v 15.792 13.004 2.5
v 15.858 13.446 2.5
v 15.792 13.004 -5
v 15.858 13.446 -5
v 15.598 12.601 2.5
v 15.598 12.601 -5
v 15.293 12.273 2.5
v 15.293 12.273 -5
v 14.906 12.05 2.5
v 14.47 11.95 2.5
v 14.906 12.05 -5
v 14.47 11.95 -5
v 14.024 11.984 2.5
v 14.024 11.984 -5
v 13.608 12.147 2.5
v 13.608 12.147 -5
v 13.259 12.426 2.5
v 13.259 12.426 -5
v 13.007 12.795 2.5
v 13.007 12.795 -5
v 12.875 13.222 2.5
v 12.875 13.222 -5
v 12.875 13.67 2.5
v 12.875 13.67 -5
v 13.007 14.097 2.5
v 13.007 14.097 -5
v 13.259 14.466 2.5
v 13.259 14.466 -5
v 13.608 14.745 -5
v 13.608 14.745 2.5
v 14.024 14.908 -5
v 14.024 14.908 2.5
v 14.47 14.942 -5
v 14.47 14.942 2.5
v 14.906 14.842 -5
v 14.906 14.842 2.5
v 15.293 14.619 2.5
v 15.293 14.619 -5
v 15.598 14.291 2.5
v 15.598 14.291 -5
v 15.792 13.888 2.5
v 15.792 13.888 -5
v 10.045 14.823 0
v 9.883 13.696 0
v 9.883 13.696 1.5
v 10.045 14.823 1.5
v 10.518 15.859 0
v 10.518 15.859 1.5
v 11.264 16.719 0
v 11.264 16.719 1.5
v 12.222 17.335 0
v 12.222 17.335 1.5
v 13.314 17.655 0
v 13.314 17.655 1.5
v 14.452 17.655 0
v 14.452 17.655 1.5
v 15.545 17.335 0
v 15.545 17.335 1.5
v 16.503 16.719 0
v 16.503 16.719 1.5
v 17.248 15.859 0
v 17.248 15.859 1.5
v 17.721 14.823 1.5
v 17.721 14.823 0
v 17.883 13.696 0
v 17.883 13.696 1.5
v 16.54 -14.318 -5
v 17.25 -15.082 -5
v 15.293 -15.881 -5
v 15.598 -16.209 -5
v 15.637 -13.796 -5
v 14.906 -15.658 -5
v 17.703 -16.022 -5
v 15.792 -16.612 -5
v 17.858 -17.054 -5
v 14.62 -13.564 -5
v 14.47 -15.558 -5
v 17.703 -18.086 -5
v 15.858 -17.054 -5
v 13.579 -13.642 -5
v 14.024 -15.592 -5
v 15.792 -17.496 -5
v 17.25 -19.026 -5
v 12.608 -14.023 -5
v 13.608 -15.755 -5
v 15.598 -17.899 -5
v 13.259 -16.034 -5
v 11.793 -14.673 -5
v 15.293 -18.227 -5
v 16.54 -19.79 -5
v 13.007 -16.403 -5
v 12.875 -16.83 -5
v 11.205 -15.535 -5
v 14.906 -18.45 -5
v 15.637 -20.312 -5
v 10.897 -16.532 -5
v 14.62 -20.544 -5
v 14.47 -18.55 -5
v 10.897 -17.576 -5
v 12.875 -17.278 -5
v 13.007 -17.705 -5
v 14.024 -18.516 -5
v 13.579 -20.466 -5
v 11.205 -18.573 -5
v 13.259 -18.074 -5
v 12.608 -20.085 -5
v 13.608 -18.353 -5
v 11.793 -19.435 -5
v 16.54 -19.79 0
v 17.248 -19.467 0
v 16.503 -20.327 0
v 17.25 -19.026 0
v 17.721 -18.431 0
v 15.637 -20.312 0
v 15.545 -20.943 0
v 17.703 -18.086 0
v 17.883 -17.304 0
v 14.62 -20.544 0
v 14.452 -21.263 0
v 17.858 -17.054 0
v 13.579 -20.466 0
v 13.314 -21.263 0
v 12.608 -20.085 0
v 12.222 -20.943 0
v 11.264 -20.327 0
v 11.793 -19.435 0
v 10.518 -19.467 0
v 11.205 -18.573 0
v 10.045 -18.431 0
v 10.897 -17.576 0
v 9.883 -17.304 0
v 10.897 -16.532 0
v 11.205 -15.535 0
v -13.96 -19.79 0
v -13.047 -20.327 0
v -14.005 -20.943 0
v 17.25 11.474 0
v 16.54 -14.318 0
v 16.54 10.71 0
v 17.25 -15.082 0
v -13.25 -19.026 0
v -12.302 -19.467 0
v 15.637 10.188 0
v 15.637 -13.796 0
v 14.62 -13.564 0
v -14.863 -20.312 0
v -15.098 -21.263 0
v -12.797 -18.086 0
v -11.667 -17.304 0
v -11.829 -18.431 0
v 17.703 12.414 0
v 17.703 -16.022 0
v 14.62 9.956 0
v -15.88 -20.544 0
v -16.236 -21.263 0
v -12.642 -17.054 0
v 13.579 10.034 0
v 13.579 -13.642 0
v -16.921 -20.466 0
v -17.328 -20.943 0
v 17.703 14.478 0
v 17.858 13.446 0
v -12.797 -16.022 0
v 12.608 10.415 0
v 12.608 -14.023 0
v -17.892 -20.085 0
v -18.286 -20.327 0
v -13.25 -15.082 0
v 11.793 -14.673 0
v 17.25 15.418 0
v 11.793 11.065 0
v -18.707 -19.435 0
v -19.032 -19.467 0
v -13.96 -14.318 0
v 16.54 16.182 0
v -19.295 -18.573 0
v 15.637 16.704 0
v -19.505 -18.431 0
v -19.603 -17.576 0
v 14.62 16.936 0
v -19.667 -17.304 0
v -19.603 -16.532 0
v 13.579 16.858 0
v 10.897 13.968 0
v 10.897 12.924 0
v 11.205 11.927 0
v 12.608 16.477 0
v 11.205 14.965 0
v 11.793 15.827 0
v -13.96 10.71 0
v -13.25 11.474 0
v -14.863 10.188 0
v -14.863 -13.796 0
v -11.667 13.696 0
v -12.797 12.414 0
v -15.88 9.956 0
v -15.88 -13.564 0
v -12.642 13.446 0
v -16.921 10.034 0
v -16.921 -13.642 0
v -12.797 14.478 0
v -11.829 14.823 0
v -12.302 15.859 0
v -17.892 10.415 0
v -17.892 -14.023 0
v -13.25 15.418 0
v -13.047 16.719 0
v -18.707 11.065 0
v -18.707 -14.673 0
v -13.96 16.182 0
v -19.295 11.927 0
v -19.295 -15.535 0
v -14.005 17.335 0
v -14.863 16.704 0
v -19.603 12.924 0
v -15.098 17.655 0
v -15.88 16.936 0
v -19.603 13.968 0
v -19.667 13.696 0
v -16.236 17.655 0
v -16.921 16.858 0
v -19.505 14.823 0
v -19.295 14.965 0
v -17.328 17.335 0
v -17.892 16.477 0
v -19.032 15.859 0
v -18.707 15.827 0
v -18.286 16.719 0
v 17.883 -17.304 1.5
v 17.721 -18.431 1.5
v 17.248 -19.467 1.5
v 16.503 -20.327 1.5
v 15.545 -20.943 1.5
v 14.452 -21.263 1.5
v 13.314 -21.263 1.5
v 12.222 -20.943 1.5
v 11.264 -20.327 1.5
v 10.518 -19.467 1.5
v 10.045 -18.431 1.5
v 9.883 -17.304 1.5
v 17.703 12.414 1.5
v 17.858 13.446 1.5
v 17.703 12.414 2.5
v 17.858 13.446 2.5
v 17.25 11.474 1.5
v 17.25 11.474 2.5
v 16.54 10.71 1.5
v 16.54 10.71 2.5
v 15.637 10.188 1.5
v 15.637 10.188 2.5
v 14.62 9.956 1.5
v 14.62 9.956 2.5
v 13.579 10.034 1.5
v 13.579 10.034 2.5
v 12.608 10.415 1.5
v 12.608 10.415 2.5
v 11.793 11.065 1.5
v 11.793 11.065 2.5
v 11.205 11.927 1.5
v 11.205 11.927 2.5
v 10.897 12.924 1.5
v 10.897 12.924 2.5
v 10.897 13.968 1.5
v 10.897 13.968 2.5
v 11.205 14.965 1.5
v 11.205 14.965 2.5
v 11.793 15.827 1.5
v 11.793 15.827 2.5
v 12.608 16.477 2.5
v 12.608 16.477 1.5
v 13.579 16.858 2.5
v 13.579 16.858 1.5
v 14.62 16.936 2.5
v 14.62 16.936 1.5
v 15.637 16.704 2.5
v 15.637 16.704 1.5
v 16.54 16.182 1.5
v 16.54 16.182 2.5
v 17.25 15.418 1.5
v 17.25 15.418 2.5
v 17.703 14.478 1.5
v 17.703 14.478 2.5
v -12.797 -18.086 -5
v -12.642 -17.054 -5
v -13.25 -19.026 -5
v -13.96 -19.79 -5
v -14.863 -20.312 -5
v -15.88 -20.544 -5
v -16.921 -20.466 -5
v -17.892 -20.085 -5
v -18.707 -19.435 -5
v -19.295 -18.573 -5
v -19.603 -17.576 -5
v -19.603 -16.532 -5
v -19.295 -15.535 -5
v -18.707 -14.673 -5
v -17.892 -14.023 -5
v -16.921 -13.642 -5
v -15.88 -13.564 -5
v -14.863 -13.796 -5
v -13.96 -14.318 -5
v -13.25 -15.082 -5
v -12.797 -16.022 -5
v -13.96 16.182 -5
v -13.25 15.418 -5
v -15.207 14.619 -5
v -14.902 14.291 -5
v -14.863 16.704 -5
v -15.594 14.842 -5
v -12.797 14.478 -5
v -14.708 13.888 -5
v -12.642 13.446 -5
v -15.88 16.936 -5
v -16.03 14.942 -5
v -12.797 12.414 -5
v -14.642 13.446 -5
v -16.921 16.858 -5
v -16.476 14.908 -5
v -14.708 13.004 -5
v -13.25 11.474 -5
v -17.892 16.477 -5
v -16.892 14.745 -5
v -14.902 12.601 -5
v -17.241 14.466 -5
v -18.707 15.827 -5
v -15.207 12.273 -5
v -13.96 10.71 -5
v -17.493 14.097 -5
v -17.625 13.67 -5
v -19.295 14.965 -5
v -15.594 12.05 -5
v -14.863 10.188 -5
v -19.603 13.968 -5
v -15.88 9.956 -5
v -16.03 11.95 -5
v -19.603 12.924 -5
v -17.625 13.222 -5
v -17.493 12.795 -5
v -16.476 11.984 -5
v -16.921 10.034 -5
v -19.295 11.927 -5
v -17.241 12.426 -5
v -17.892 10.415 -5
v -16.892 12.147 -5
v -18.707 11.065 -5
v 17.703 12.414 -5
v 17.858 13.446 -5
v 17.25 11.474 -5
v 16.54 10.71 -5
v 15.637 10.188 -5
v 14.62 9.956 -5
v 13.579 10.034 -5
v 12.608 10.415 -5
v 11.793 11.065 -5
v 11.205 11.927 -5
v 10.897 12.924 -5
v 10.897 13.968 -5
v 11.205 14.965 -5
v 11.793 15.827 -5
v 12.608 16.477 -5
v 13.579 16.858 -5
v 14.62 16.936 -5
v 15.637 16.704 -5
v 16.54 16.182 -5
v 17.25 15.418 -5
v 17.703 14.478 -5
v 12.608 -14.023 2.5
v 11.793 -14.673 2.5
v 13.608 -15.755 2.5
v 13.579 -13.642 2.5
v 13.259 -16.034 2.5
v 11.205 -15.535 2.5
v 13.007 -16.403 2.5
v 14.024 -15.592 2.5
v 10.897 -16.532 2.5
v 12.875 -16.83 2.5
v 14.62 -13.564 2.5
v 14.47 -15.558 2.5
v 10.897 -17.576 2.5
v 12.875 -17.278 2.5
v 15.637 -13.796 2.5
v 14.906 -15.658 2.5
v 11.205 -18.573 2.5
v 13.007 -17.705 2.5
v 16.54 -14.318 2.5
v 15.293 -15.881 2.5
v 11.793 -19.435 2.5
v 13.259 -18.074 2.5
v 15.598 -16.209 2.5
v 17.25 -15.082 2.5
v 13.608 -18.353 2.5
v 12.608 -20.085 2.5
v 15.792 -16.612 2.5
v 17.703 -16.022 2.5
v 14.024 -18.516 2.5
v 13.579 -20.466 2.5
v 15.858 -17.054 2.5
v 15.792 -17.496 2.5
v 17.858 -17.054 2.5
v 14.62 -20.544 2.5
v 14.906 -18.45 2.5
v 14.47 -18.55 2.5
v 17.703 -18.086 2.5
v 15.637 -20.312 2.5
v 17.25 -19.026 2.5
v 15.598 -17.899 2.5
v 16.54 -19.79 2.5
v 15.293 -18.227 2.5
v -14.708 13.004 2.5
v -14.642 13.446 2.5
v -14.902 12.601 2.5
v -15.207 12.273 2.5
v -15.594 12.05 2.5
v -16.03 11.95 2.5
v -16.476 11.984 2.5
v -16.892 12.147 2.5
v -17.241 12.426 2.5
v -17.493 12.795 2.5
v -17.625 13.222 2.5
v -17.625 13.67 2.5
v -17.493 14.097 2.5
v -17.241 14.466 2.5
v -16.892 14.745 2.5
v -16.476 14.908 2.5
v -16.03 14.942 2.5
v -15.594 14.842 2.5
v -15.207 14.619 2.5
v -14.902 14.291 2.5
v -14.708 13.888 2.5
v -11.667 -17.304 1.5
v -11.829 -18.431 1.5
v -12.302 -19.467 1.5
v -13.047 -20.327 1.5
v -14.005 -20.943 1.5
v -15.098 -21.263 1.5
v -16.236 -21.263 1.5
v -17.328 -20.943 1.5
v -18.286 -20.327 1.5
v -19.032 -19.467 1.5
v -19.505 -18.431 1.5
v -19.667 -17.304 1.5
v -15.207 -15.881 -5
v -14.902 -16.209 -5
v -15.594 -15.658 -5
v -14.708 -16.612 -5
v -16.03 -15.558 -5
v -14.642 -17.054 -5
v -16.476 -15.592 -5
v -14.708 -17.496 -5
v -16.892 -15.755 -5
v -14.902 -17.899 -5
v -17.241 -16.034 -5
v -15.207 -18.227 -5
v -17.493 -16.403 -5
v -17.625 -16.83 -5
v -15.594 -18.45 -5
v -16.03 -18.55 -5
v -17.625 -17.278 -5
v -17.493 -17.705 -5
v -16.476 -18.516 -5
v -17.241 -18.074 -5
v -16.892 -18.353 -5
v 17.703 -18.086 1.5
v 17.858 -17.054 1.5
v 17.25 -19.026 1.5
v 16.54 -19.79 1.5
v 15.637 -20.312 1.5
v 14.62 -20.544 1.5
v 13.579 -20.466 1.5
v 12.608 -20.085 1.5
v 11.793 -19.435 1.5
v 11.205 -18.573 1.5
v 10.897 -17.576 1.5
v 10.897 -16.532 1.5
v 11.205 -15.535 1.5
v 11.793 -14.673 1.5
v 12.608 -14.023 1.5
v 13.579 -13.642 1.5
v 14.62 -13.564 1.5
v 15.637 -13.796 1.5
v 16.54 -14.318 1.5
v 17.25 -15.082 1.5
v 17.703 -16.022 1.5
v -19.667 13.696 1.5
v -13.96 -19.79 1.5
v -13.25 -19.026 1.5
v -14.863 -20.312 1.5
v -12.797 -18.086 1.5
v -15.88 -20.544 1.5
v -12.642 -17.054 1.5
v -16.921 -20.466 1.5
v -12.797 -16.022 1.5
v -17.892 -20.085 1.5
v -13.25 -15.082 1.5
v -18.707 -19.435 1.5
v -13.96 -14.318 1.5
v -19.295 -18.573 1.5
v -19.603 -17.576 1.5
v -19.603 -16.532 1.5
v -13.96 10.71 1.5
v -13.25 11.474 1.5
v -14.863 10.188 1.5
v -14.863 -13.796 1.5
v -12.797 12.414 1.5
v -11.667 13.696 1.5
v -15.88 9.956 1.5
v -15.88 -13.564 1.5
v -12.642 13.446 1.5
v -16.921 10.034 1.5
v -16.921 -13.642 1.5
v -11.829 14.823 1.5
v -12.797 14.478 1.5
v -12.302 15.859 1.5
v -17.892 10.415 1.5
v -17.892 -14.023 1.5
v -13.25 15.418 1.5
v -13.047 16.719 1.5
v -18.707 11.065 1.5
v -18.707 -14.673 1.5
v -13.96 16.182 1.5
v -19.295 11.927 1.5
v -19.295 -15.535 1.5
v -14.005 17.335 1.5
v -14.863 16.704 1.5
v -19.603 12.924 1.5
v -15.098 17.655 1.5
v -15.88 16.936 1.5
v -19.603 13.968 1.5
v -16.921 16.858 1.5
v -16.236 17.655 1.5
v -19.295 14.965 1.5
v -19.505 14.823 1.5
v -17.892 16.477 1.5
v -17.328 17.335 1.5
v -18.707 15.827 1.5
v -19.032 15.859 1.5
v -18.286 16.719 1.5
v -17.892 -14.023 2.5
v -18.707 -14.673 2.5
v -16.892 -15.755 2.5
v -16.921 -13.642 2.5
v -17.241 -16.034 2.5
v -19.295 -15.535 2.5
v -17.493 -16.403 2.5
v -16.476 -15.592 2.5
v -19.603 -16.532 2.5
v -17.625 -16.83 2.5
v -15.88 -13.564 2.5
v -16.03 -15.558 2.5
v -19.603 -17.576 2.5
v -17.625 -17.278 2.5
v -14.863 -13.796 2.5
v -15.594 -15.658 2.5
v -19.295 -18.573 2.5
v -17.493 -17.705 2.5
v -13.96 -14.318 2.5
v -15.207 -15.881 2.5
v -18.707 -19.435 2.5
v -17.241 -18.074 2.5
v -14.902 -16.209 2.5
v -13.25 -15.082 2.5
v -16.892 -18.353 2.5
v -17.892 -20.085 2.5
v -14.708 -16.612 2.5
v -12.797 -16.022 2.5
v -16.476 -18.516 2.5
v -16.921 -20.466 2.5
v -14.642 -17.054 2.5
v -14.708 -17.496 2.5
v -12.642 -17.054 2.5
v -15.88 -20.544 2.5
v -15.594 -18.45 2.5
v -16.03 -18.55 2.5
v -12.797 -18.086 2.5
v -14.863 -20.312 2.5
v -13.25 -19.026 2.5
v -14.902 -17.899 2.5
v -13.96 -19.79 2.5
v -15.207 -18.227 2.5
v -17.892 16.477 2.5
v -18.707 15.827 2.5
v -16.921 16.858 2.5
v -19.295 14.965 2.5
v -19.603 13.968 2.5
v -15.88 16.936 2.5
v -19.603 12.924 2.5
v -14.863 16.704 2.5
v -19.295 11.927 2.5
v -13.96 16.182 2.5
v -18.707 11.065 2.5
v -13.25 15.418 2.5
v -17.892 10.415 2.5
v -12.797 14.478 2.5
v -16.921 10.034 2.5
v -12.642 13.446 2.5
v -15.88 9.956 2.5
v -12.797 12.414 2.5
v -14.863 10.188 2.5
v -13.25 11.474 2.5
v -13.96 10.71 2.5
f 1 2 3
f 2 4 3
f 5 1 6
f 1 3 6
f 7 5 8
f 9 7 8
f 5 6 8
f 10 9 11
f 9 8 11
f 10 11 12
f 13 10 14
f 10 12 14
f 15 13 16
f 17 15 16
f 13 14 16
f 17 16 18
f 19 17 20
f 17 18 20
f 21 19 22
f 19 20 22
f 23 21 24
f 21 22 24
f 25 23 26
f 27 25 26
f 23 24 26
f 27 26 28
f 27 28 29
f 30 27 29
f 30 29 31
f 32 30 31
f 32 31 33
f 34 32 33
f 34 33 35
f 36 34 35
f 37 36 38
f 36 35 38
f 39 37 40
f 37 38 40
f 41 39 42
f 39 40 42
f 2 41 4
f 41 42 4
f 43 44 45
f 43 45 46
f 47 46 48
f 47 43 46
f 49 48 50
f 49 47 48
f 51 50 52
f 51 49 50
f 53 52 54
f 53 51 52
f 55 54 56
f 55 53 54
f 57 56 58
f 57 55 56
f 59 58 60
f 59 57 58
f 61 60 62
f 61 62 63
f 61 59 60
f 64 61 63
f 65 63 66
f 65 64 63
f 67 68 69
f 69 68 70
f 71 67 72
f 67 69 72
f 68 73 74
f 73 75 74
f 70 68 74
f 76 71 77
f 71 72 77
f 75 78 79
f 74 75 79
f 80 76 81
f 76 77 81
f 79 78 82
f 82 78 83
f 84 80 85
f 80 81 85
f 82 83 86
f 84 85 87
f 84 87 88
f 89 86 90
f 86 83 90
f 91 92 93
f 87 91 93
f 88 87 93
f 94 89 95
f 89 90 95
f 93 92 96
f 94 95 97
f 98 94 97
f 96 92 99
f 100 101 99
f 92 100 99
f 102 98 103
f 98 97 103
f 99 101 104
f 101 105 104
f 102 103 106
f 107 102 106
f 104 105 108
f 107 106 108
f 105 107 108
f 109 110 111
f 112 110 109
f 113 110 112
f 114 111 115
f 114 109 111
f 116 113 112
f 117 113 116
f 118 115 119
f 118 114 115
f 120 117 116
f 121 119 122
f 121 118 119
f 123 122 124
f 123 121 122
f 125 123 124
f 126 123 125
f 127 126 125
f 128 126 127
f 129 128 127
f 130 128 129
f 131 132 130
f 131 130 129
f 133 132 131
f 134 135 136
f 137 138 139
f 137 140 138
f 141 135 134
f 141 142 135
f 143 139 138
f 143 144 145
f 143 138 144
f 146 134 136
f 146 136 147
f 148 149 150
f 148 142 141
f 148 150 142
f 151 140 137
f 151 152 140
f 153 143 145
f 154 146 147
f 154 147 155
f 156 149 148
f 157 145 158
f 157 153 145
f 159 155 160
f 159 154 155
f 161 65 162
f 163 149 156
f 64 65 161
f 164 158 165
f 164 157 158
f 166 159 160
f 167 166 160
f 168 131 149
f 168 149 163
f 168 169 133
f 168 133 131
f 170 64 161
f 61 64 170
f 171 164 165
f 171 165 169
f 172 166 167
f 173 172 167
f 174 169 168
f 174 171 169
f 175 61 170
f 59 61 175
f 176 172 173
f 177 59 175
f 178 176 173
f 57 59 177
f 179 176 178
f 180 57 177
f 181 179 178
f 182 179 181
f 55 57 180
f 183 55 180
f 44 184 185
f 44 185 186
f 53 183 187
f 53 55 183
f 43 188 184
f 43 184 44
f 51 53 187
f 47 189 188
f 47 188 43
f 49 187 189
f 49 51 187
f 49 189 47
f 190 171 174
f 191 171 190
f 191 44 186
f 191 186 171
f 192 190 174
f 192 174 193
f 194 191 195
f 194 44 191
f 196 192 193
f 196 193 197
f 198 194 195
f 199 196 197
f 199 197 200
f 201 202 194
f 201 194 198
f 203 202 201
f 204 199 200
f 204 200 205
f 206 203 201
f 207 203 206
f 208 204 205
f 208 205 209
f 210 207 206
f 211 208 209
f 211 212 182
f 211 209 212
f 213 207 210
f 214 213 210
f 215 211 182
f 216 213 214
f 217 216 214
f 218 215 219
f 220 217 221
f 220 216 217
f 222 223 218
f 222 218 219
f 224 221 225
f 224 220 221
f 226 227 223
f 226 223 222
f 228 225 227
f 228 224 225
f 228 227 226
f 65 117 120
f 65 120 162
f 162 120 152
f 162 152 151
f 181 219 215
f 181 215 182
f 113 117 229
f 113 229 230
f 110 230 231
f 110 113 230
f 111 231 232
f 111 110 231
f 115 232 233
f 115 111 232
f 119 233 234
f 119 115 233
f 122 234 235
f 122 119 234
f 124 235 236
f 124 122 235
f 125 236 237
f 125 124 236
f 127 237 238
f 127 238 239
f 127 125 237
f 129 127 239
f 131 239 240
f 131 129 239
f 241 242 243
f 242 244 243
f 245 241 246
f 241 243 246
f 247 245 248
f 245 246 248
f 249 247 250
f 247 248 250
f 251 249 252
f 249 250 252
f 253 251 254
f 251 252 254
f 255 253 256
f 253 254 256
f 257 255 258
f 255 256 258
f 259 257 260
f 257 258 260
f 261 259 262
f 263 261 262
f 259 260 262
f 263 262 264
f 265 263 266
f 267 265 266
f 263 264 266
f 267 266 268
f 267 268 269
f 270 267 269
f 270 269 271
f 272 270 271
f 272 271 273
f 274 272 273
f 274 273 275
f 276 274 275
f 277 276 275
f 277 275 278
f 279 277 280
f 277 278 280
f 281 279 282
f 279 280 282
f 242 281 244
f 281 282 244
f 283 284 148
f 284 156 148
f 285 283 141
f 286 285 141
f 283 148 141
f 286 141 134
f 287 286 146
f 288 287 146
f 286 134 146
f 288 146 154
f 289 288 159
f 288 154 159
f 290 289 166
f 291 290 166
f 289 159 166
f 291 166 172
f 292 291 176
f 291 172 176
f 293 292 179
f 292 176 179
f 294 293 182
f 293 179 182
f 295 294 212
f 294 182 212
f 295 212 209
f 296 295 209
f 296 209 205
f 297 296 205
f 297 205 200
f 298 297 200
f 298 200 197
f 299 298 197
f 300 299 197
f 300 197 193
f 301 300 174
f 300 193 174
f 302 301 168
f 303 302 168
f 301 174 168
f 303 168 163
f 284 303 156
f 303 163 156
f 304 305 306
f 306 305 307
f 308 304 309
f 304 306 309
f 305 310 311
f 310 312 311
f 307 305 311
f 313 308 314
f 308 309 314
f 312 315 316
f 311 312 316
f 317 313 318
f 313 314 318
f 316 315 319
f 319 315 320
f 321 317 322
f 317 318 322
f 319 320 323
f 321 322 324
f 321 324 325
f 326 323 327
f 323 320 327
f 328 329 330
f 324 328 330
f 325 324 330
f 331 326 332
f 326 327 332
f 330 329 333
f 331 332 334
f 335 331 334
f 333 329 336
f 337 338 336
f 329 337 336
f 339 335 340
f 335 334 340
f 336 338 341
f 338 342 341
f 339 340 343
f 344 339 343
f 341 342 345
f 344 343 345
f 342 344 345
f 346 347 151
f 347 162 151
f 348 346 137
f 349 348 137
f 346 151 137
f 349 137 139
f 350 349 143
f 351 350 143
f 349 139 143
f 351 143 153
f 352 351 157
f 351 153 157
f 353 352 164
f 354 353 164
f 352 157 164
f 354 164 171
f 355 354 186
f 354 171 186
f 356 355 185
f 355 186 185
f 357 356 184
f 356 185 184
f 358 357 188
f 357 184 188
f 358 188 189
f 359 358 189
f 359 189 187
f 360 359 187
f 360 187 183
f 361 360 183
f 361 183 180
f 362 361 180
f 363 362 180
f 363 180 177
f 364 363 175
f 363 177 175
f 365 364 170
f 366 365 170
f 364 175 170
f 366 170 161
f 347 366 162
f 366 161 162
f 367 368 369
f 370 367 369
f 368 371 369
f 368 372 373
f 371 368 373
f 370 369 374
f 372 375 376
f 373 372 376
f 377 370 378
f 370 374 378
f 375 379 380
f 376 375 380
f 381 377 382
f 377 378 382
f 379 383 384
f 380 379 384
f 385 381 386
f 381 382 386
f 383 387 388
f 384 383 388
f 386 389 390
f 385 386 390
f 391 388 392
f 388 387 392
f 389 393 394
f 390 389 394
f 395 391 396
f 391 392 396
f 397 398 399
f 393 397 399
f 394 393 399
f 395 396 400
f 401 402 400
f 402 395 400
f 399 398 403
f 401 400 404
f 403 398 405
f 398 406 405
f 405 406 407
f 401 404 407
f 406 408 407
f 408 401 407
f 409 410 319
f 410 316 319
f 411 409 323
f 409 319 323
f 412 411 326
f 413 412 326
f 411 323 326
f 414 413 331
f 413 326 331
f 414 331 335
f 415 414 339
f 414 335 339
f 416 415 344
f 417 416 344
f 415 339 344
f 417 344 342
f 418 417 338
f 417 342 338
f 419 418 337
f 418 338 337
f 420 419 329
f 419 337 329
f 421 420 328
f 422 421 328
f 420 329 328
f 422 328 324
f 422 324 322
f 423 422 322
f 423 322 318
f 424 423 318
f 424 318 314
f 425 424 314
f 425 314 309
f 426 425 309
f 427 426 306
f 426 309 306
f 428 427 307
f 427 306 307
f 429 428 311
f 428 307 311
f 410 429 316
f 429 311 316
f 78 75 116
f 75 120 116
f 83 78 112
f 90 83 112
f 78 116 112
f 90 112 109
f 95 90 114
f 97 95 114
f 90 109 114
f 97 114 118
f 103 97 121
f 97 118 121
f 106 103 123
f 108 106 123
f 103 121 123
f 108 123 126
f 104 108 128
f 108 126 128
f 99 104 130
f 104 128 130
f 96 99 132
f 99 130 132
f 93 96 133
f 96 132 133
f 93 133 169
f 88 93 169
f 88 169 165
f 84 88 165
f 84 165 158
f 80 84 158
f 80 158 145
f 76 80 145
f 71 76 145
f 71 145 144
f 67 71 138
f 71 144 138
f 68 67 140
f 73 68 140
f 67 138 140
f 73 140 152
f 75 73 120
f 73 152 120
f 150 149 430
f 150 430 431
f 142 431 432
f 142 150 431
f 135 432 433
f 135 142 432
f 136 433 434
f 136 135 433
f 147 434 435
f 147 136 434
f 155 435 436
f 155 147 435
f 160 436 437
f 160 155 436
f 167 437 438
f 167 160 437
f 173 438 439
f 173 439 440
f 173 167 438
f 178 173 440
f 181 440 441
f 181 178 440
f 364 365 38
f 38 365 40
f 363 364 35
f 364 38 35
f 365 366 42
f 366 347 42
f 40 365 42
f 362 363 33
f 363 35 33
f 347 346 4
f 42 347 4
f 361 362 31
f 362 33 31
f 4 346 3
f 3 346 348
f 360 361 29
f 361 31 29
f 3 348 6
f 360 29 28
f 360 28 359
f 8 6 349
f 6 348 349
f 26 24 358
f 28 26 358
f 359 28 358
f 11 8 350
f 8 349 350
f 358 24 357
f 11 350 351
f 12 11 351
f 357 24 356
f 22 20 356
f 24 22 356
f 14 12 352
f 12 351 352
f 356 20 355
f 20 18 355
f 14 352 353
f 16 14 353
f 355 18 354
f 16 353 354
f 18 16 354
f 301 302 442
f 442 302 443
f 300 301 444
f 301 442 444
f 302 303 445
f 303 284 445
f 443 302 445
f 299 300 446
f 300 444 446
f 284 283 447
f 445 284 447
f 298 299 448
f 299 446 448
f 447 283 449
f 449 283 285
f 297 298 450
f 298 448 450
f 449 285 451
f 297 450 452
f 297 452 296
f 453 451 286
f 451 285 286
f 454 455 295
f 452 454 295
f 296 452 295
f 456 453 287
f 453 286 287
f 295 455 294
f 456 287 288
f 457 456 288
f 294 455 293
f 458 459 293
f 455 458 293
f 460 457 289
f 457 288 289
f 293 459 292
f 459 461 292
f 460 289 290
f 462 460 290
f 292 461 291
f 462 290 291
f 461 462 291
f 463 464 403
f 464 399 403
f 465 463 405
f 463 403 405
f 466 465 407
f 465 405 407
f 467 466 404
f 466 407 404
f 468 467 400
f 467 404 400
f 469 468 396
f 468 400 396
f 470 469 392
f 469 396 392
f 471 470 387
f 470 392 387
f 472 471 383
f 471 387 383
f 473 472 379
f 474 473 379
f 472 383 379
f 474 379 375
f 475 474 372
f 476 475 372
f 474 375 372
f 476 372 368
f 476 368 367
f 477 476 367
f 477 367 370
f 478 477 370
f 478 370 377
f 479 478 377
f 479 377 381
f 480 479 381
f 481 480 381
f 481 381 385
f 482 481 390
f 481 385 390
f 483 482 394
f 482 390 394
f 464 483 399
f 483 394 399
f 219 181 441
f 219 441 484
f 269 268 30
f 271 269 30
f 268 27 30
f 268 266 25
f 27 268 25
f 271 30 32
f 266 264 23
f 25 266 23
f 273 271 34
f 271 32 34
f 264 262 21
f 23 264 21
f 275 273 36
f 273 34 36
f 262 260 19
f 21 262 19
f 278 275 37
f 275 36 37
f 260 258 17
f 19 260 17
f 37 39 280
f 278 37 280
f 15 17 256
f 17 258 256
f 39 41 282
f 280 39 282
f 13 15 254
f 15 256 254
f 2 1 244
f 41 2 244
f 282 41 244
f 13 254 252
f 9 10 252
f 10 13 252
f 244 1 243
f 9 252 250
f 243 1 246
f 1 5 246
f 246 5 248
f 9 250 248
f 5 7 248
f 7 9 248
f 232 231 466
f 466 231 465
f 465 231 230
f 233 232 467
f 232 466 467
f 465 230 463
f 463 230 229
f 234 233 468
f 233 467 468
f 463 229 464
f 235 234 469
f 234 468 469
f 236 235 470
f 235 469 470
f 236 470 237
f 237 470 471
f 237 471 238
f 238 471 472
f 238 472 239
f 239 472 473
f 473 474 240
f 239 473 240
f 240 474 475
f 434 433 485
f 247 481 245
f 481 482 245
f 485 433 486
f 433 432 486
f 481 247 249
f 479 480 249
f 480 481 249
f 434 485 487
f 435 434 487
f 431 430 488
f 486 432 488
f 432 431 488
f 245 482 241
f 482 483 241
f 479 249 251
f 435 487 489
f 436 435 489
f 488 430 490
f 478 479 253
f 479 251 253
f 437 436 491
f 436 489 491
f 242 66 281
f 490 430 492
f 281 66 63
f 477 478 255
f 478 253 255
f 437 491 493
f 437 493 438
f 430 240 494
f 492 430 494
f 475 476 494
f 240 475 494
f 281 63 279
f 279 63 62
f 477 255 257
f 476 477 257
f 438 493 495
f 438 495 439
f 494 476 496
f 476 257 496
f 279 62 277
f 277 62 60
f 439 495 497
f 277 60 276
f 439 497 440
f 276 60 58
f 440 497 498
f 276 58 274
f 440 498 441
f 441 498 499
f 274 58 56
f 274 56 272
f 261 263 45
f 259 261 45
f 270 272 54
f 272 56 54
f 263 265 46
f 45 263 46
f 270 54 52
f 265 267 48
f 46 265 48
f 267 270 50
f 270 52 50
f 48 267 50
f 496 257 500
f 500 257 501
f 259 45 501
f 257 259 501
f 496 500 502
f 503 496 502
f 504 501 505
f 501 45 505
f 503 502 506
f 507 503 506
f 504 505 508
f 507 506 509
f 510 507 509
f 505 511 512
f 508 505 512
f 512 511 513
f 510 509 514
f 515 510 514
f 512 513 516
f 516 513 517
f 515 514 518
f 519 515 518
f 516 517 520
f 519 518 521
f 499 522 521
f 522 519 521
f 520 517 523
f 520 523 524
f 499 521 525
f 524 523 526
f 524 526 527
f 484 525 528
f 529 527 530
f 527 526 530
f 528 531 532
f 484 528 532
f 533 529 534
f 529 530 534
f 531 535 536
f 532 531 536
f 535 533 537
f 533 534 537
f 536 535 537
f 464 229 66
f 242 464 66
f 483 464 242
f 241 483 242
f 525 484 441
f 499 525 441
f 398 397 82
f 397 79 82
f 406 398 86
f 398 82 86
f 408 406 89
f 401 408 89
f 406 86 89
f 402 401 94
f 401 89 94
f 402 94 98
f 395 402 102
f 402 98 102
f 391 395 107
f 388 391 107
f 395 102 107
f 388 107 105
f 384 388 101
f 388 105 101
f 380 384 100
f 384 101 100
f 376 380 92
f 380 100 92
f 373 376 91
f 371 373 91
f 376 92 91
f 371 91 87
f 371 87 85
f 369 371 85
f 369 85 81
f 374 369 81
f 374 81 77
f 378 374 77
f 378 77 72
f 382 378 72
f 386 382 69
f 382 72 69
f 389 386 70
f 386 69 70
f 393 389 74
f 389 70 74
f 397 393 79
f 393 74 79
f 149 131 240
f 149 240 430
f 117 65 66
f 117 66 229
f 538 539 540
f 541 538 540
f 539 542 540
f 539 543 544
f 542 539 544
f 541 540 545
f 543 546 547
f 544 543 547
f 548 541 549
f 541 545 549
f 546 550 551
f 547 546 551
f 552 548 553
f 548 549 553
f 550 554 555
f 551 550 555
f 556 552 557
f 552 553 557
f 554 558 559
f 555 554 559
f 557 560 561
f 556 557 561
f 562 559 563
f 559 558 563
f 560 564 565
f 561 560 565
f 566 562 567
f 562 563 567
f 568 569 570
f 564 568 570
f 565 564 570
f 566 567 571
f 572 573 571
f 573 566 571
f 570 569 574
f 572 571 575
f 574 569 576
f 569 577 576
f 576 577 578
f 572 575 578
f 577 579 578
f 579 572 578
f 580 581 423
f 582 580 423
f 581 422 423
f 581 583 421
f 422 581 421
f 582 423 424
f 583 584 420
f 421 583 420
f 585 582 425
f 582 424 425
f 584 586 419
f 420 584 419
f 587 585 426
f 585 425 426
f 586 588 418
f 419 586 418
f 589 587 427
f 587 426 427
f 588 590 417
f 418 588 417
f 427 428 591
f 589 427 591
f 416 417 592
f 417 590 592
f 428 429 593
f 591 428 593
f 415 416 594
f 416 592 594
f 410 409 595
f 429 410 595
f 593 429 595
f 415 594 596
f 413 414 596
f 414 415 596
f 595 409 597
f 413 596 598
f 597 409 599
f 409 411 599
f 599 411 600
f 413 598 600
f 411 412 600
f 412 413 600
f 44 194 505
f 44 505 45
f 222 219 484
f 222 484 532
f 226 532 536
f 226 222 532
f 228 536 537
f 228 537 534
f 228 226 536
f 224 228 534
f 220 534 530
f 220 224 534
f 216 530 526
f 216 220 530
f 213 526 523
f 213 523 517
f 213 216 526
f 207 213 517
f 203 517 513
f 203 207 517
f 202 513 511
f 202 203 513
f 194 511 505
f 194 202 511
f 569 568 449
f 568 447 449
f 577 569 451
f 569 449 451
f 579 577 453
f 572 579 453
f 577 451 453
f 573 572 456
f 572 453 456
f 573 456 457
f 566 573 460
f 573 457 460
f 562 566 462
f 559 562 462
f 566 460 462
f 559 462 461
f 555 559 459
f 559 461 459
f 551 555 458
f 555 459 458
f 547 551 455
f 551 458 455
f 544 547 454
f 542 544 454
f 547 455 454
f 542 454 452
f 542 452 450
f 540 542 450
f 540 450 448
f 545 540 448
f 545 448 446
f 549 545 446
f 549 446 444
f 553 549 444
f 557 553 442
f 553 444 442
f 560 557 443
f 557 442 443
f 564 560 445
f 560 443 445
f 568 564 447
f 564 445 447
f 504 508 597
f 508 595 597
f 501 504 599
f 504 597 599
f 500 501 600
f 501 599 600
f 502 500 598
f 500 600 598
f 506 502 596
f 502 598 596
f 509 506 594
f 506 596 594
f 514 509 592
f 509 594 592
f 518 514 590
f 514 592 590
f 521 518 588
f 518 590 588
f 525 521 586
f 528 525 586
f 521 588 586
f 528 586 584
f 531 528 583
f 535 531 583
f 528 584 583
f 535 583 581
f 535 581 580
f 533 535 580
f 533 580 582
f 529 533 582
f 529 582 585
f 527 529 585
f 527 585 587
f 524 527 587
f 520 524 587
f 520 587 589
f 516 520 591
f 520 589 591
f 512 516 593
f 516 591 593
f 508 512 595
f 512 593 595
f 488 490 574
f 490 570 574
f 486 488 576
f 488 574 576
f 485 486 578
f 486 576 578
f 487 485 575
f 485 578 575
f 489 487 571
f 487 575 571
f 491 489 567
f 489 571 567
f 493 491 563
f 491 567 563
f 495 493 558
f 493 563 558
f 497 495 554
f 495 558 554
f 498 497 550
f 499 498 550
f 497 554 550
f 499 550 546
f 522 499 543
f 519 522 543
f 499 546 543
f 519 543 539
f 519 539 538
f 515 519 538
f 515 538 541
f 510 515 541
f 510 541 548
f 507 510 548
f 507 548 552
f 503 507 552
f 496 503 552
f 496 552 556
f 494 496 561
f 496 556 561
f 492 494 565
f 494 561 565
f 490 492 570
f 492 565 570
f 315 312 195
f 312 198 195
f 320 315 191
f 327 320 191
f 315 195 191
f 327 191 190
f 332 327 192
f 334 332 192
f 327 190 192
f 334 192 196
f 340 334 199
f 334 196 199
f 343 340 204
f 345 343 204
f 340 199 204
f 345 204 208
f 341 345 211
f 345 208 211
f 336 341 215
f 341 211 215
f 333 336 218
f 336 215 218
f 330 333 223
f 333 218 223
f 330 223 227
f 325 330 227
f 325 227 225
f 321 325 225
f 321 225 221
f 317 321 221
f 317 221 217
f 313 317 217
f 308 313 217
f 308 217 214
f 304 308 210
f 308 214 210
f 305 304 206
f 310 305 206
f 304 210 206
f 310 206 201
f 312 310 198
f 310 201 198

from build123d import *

# Parameters (mm, degrees)
CROQUIS1_R              = 2.5
SALIENTE_EXTRUIR1_DEPTH = 1.5
MATRIZL1_COUNT          = 2
MATRIZL1_PITCH          = 30.5
MATRIZL1_COUNT_DIR2     = 2
MATRIZL1_PITCH_DIR2     = 30.5


with BuildPart() as part:
    # Croquis1 → Saliente-Extruir1 (new body)
    with BuildSketch(Plane.XY):
        with BuildLine():
            Line((17.88322612, 13.695977011), (17.88322612, -17.304022989))
            ThreePointArc((17.88322612, -17.304022989), (13.88322612, -21.304022989), (9.88322612, -17.304022989))
            Line((9.88322612, -17.304022989), (-11.66677388, -17.304022989))
            ThreePointArc((-11.66677388, -17.304022989), (-15.66677388, -21.304022989), (-19.66677388, -17.304022989))
            Line((-19.66677388, -17.304022989), (-19.66677388, 13.695977011))
            ThreePointArc((-19.66677388, 13.695977011), (-15.66677388, 17.695977011), (-11.66677388, 13.695977011))
            Line((-11.66677388, 13.695977011), (9.88322612, 13.695977011))
            ThreePointArc((9.88322612, 13.695977011), (13.88322612, 17.695977011), (17.88322612, 13.695977011))
        make_face()
        with Locations((-16.14177388, 13.445977011)):
            Circle(CROQUIS1_R, mode=Mode.SUBTRACT)
        with Locations((14.35822612, 13.445977011)):
            Circle(CROQUIS1_R, mode=Mode.SUBTRACT)
        with Locations((14.35822612, -17.054022989)):
            Circle(CROQUIS1_R, mode=Mode.SUBTRACT)
        with Locations((-16.14177388, -17.054022989)):
            Circle(CROQUIS1_R, mode=Mode.SUBTRACT)
    extrude(amount=SALIENTE_EXTRUIR1_DEPTH)

    # Croquis3 → Revolución1 (revolve)
    with BuildSketch(Plane(origin=(0, -17.054022989, 0), x_dir=(-1, 0, 0), z_dir=(0, -1, 0)), mode=Mode.PRIVATE) as revoluci_n1_sk:
        Polygon((18.64177388, -1.5), (19.64177388, -1.5), (19.64177388, -2.5), (17.64177388, -2.5), (17.64177388, 5), (19.64177388, 5), (19.64177388, 0), (18.64177388, 0), align=None)
    revoluci_n1 = revolve(revoluci_n1_sk.sketch.rotate(Axis((-16.14177388, -17.054022989, 2.5), (0, 0, -1)), 180), axis=Axis((-16.14177388, -17.054022989, 2.5), (0, 0, -1)))

    # MatrizL1: Revoluci_n1 2 × 2
    with Locations(*[(i * MATRIZL1_PITCH, j * MATRIZL1_PITCH_DIR2, 0) for i in range(MATRIZL1_COUNT) for j in range(MATRIZL1_COUNT_DIR2) if (i, j) != (0, 0)]):
        add(revoluci_n1)


solid = part.part
